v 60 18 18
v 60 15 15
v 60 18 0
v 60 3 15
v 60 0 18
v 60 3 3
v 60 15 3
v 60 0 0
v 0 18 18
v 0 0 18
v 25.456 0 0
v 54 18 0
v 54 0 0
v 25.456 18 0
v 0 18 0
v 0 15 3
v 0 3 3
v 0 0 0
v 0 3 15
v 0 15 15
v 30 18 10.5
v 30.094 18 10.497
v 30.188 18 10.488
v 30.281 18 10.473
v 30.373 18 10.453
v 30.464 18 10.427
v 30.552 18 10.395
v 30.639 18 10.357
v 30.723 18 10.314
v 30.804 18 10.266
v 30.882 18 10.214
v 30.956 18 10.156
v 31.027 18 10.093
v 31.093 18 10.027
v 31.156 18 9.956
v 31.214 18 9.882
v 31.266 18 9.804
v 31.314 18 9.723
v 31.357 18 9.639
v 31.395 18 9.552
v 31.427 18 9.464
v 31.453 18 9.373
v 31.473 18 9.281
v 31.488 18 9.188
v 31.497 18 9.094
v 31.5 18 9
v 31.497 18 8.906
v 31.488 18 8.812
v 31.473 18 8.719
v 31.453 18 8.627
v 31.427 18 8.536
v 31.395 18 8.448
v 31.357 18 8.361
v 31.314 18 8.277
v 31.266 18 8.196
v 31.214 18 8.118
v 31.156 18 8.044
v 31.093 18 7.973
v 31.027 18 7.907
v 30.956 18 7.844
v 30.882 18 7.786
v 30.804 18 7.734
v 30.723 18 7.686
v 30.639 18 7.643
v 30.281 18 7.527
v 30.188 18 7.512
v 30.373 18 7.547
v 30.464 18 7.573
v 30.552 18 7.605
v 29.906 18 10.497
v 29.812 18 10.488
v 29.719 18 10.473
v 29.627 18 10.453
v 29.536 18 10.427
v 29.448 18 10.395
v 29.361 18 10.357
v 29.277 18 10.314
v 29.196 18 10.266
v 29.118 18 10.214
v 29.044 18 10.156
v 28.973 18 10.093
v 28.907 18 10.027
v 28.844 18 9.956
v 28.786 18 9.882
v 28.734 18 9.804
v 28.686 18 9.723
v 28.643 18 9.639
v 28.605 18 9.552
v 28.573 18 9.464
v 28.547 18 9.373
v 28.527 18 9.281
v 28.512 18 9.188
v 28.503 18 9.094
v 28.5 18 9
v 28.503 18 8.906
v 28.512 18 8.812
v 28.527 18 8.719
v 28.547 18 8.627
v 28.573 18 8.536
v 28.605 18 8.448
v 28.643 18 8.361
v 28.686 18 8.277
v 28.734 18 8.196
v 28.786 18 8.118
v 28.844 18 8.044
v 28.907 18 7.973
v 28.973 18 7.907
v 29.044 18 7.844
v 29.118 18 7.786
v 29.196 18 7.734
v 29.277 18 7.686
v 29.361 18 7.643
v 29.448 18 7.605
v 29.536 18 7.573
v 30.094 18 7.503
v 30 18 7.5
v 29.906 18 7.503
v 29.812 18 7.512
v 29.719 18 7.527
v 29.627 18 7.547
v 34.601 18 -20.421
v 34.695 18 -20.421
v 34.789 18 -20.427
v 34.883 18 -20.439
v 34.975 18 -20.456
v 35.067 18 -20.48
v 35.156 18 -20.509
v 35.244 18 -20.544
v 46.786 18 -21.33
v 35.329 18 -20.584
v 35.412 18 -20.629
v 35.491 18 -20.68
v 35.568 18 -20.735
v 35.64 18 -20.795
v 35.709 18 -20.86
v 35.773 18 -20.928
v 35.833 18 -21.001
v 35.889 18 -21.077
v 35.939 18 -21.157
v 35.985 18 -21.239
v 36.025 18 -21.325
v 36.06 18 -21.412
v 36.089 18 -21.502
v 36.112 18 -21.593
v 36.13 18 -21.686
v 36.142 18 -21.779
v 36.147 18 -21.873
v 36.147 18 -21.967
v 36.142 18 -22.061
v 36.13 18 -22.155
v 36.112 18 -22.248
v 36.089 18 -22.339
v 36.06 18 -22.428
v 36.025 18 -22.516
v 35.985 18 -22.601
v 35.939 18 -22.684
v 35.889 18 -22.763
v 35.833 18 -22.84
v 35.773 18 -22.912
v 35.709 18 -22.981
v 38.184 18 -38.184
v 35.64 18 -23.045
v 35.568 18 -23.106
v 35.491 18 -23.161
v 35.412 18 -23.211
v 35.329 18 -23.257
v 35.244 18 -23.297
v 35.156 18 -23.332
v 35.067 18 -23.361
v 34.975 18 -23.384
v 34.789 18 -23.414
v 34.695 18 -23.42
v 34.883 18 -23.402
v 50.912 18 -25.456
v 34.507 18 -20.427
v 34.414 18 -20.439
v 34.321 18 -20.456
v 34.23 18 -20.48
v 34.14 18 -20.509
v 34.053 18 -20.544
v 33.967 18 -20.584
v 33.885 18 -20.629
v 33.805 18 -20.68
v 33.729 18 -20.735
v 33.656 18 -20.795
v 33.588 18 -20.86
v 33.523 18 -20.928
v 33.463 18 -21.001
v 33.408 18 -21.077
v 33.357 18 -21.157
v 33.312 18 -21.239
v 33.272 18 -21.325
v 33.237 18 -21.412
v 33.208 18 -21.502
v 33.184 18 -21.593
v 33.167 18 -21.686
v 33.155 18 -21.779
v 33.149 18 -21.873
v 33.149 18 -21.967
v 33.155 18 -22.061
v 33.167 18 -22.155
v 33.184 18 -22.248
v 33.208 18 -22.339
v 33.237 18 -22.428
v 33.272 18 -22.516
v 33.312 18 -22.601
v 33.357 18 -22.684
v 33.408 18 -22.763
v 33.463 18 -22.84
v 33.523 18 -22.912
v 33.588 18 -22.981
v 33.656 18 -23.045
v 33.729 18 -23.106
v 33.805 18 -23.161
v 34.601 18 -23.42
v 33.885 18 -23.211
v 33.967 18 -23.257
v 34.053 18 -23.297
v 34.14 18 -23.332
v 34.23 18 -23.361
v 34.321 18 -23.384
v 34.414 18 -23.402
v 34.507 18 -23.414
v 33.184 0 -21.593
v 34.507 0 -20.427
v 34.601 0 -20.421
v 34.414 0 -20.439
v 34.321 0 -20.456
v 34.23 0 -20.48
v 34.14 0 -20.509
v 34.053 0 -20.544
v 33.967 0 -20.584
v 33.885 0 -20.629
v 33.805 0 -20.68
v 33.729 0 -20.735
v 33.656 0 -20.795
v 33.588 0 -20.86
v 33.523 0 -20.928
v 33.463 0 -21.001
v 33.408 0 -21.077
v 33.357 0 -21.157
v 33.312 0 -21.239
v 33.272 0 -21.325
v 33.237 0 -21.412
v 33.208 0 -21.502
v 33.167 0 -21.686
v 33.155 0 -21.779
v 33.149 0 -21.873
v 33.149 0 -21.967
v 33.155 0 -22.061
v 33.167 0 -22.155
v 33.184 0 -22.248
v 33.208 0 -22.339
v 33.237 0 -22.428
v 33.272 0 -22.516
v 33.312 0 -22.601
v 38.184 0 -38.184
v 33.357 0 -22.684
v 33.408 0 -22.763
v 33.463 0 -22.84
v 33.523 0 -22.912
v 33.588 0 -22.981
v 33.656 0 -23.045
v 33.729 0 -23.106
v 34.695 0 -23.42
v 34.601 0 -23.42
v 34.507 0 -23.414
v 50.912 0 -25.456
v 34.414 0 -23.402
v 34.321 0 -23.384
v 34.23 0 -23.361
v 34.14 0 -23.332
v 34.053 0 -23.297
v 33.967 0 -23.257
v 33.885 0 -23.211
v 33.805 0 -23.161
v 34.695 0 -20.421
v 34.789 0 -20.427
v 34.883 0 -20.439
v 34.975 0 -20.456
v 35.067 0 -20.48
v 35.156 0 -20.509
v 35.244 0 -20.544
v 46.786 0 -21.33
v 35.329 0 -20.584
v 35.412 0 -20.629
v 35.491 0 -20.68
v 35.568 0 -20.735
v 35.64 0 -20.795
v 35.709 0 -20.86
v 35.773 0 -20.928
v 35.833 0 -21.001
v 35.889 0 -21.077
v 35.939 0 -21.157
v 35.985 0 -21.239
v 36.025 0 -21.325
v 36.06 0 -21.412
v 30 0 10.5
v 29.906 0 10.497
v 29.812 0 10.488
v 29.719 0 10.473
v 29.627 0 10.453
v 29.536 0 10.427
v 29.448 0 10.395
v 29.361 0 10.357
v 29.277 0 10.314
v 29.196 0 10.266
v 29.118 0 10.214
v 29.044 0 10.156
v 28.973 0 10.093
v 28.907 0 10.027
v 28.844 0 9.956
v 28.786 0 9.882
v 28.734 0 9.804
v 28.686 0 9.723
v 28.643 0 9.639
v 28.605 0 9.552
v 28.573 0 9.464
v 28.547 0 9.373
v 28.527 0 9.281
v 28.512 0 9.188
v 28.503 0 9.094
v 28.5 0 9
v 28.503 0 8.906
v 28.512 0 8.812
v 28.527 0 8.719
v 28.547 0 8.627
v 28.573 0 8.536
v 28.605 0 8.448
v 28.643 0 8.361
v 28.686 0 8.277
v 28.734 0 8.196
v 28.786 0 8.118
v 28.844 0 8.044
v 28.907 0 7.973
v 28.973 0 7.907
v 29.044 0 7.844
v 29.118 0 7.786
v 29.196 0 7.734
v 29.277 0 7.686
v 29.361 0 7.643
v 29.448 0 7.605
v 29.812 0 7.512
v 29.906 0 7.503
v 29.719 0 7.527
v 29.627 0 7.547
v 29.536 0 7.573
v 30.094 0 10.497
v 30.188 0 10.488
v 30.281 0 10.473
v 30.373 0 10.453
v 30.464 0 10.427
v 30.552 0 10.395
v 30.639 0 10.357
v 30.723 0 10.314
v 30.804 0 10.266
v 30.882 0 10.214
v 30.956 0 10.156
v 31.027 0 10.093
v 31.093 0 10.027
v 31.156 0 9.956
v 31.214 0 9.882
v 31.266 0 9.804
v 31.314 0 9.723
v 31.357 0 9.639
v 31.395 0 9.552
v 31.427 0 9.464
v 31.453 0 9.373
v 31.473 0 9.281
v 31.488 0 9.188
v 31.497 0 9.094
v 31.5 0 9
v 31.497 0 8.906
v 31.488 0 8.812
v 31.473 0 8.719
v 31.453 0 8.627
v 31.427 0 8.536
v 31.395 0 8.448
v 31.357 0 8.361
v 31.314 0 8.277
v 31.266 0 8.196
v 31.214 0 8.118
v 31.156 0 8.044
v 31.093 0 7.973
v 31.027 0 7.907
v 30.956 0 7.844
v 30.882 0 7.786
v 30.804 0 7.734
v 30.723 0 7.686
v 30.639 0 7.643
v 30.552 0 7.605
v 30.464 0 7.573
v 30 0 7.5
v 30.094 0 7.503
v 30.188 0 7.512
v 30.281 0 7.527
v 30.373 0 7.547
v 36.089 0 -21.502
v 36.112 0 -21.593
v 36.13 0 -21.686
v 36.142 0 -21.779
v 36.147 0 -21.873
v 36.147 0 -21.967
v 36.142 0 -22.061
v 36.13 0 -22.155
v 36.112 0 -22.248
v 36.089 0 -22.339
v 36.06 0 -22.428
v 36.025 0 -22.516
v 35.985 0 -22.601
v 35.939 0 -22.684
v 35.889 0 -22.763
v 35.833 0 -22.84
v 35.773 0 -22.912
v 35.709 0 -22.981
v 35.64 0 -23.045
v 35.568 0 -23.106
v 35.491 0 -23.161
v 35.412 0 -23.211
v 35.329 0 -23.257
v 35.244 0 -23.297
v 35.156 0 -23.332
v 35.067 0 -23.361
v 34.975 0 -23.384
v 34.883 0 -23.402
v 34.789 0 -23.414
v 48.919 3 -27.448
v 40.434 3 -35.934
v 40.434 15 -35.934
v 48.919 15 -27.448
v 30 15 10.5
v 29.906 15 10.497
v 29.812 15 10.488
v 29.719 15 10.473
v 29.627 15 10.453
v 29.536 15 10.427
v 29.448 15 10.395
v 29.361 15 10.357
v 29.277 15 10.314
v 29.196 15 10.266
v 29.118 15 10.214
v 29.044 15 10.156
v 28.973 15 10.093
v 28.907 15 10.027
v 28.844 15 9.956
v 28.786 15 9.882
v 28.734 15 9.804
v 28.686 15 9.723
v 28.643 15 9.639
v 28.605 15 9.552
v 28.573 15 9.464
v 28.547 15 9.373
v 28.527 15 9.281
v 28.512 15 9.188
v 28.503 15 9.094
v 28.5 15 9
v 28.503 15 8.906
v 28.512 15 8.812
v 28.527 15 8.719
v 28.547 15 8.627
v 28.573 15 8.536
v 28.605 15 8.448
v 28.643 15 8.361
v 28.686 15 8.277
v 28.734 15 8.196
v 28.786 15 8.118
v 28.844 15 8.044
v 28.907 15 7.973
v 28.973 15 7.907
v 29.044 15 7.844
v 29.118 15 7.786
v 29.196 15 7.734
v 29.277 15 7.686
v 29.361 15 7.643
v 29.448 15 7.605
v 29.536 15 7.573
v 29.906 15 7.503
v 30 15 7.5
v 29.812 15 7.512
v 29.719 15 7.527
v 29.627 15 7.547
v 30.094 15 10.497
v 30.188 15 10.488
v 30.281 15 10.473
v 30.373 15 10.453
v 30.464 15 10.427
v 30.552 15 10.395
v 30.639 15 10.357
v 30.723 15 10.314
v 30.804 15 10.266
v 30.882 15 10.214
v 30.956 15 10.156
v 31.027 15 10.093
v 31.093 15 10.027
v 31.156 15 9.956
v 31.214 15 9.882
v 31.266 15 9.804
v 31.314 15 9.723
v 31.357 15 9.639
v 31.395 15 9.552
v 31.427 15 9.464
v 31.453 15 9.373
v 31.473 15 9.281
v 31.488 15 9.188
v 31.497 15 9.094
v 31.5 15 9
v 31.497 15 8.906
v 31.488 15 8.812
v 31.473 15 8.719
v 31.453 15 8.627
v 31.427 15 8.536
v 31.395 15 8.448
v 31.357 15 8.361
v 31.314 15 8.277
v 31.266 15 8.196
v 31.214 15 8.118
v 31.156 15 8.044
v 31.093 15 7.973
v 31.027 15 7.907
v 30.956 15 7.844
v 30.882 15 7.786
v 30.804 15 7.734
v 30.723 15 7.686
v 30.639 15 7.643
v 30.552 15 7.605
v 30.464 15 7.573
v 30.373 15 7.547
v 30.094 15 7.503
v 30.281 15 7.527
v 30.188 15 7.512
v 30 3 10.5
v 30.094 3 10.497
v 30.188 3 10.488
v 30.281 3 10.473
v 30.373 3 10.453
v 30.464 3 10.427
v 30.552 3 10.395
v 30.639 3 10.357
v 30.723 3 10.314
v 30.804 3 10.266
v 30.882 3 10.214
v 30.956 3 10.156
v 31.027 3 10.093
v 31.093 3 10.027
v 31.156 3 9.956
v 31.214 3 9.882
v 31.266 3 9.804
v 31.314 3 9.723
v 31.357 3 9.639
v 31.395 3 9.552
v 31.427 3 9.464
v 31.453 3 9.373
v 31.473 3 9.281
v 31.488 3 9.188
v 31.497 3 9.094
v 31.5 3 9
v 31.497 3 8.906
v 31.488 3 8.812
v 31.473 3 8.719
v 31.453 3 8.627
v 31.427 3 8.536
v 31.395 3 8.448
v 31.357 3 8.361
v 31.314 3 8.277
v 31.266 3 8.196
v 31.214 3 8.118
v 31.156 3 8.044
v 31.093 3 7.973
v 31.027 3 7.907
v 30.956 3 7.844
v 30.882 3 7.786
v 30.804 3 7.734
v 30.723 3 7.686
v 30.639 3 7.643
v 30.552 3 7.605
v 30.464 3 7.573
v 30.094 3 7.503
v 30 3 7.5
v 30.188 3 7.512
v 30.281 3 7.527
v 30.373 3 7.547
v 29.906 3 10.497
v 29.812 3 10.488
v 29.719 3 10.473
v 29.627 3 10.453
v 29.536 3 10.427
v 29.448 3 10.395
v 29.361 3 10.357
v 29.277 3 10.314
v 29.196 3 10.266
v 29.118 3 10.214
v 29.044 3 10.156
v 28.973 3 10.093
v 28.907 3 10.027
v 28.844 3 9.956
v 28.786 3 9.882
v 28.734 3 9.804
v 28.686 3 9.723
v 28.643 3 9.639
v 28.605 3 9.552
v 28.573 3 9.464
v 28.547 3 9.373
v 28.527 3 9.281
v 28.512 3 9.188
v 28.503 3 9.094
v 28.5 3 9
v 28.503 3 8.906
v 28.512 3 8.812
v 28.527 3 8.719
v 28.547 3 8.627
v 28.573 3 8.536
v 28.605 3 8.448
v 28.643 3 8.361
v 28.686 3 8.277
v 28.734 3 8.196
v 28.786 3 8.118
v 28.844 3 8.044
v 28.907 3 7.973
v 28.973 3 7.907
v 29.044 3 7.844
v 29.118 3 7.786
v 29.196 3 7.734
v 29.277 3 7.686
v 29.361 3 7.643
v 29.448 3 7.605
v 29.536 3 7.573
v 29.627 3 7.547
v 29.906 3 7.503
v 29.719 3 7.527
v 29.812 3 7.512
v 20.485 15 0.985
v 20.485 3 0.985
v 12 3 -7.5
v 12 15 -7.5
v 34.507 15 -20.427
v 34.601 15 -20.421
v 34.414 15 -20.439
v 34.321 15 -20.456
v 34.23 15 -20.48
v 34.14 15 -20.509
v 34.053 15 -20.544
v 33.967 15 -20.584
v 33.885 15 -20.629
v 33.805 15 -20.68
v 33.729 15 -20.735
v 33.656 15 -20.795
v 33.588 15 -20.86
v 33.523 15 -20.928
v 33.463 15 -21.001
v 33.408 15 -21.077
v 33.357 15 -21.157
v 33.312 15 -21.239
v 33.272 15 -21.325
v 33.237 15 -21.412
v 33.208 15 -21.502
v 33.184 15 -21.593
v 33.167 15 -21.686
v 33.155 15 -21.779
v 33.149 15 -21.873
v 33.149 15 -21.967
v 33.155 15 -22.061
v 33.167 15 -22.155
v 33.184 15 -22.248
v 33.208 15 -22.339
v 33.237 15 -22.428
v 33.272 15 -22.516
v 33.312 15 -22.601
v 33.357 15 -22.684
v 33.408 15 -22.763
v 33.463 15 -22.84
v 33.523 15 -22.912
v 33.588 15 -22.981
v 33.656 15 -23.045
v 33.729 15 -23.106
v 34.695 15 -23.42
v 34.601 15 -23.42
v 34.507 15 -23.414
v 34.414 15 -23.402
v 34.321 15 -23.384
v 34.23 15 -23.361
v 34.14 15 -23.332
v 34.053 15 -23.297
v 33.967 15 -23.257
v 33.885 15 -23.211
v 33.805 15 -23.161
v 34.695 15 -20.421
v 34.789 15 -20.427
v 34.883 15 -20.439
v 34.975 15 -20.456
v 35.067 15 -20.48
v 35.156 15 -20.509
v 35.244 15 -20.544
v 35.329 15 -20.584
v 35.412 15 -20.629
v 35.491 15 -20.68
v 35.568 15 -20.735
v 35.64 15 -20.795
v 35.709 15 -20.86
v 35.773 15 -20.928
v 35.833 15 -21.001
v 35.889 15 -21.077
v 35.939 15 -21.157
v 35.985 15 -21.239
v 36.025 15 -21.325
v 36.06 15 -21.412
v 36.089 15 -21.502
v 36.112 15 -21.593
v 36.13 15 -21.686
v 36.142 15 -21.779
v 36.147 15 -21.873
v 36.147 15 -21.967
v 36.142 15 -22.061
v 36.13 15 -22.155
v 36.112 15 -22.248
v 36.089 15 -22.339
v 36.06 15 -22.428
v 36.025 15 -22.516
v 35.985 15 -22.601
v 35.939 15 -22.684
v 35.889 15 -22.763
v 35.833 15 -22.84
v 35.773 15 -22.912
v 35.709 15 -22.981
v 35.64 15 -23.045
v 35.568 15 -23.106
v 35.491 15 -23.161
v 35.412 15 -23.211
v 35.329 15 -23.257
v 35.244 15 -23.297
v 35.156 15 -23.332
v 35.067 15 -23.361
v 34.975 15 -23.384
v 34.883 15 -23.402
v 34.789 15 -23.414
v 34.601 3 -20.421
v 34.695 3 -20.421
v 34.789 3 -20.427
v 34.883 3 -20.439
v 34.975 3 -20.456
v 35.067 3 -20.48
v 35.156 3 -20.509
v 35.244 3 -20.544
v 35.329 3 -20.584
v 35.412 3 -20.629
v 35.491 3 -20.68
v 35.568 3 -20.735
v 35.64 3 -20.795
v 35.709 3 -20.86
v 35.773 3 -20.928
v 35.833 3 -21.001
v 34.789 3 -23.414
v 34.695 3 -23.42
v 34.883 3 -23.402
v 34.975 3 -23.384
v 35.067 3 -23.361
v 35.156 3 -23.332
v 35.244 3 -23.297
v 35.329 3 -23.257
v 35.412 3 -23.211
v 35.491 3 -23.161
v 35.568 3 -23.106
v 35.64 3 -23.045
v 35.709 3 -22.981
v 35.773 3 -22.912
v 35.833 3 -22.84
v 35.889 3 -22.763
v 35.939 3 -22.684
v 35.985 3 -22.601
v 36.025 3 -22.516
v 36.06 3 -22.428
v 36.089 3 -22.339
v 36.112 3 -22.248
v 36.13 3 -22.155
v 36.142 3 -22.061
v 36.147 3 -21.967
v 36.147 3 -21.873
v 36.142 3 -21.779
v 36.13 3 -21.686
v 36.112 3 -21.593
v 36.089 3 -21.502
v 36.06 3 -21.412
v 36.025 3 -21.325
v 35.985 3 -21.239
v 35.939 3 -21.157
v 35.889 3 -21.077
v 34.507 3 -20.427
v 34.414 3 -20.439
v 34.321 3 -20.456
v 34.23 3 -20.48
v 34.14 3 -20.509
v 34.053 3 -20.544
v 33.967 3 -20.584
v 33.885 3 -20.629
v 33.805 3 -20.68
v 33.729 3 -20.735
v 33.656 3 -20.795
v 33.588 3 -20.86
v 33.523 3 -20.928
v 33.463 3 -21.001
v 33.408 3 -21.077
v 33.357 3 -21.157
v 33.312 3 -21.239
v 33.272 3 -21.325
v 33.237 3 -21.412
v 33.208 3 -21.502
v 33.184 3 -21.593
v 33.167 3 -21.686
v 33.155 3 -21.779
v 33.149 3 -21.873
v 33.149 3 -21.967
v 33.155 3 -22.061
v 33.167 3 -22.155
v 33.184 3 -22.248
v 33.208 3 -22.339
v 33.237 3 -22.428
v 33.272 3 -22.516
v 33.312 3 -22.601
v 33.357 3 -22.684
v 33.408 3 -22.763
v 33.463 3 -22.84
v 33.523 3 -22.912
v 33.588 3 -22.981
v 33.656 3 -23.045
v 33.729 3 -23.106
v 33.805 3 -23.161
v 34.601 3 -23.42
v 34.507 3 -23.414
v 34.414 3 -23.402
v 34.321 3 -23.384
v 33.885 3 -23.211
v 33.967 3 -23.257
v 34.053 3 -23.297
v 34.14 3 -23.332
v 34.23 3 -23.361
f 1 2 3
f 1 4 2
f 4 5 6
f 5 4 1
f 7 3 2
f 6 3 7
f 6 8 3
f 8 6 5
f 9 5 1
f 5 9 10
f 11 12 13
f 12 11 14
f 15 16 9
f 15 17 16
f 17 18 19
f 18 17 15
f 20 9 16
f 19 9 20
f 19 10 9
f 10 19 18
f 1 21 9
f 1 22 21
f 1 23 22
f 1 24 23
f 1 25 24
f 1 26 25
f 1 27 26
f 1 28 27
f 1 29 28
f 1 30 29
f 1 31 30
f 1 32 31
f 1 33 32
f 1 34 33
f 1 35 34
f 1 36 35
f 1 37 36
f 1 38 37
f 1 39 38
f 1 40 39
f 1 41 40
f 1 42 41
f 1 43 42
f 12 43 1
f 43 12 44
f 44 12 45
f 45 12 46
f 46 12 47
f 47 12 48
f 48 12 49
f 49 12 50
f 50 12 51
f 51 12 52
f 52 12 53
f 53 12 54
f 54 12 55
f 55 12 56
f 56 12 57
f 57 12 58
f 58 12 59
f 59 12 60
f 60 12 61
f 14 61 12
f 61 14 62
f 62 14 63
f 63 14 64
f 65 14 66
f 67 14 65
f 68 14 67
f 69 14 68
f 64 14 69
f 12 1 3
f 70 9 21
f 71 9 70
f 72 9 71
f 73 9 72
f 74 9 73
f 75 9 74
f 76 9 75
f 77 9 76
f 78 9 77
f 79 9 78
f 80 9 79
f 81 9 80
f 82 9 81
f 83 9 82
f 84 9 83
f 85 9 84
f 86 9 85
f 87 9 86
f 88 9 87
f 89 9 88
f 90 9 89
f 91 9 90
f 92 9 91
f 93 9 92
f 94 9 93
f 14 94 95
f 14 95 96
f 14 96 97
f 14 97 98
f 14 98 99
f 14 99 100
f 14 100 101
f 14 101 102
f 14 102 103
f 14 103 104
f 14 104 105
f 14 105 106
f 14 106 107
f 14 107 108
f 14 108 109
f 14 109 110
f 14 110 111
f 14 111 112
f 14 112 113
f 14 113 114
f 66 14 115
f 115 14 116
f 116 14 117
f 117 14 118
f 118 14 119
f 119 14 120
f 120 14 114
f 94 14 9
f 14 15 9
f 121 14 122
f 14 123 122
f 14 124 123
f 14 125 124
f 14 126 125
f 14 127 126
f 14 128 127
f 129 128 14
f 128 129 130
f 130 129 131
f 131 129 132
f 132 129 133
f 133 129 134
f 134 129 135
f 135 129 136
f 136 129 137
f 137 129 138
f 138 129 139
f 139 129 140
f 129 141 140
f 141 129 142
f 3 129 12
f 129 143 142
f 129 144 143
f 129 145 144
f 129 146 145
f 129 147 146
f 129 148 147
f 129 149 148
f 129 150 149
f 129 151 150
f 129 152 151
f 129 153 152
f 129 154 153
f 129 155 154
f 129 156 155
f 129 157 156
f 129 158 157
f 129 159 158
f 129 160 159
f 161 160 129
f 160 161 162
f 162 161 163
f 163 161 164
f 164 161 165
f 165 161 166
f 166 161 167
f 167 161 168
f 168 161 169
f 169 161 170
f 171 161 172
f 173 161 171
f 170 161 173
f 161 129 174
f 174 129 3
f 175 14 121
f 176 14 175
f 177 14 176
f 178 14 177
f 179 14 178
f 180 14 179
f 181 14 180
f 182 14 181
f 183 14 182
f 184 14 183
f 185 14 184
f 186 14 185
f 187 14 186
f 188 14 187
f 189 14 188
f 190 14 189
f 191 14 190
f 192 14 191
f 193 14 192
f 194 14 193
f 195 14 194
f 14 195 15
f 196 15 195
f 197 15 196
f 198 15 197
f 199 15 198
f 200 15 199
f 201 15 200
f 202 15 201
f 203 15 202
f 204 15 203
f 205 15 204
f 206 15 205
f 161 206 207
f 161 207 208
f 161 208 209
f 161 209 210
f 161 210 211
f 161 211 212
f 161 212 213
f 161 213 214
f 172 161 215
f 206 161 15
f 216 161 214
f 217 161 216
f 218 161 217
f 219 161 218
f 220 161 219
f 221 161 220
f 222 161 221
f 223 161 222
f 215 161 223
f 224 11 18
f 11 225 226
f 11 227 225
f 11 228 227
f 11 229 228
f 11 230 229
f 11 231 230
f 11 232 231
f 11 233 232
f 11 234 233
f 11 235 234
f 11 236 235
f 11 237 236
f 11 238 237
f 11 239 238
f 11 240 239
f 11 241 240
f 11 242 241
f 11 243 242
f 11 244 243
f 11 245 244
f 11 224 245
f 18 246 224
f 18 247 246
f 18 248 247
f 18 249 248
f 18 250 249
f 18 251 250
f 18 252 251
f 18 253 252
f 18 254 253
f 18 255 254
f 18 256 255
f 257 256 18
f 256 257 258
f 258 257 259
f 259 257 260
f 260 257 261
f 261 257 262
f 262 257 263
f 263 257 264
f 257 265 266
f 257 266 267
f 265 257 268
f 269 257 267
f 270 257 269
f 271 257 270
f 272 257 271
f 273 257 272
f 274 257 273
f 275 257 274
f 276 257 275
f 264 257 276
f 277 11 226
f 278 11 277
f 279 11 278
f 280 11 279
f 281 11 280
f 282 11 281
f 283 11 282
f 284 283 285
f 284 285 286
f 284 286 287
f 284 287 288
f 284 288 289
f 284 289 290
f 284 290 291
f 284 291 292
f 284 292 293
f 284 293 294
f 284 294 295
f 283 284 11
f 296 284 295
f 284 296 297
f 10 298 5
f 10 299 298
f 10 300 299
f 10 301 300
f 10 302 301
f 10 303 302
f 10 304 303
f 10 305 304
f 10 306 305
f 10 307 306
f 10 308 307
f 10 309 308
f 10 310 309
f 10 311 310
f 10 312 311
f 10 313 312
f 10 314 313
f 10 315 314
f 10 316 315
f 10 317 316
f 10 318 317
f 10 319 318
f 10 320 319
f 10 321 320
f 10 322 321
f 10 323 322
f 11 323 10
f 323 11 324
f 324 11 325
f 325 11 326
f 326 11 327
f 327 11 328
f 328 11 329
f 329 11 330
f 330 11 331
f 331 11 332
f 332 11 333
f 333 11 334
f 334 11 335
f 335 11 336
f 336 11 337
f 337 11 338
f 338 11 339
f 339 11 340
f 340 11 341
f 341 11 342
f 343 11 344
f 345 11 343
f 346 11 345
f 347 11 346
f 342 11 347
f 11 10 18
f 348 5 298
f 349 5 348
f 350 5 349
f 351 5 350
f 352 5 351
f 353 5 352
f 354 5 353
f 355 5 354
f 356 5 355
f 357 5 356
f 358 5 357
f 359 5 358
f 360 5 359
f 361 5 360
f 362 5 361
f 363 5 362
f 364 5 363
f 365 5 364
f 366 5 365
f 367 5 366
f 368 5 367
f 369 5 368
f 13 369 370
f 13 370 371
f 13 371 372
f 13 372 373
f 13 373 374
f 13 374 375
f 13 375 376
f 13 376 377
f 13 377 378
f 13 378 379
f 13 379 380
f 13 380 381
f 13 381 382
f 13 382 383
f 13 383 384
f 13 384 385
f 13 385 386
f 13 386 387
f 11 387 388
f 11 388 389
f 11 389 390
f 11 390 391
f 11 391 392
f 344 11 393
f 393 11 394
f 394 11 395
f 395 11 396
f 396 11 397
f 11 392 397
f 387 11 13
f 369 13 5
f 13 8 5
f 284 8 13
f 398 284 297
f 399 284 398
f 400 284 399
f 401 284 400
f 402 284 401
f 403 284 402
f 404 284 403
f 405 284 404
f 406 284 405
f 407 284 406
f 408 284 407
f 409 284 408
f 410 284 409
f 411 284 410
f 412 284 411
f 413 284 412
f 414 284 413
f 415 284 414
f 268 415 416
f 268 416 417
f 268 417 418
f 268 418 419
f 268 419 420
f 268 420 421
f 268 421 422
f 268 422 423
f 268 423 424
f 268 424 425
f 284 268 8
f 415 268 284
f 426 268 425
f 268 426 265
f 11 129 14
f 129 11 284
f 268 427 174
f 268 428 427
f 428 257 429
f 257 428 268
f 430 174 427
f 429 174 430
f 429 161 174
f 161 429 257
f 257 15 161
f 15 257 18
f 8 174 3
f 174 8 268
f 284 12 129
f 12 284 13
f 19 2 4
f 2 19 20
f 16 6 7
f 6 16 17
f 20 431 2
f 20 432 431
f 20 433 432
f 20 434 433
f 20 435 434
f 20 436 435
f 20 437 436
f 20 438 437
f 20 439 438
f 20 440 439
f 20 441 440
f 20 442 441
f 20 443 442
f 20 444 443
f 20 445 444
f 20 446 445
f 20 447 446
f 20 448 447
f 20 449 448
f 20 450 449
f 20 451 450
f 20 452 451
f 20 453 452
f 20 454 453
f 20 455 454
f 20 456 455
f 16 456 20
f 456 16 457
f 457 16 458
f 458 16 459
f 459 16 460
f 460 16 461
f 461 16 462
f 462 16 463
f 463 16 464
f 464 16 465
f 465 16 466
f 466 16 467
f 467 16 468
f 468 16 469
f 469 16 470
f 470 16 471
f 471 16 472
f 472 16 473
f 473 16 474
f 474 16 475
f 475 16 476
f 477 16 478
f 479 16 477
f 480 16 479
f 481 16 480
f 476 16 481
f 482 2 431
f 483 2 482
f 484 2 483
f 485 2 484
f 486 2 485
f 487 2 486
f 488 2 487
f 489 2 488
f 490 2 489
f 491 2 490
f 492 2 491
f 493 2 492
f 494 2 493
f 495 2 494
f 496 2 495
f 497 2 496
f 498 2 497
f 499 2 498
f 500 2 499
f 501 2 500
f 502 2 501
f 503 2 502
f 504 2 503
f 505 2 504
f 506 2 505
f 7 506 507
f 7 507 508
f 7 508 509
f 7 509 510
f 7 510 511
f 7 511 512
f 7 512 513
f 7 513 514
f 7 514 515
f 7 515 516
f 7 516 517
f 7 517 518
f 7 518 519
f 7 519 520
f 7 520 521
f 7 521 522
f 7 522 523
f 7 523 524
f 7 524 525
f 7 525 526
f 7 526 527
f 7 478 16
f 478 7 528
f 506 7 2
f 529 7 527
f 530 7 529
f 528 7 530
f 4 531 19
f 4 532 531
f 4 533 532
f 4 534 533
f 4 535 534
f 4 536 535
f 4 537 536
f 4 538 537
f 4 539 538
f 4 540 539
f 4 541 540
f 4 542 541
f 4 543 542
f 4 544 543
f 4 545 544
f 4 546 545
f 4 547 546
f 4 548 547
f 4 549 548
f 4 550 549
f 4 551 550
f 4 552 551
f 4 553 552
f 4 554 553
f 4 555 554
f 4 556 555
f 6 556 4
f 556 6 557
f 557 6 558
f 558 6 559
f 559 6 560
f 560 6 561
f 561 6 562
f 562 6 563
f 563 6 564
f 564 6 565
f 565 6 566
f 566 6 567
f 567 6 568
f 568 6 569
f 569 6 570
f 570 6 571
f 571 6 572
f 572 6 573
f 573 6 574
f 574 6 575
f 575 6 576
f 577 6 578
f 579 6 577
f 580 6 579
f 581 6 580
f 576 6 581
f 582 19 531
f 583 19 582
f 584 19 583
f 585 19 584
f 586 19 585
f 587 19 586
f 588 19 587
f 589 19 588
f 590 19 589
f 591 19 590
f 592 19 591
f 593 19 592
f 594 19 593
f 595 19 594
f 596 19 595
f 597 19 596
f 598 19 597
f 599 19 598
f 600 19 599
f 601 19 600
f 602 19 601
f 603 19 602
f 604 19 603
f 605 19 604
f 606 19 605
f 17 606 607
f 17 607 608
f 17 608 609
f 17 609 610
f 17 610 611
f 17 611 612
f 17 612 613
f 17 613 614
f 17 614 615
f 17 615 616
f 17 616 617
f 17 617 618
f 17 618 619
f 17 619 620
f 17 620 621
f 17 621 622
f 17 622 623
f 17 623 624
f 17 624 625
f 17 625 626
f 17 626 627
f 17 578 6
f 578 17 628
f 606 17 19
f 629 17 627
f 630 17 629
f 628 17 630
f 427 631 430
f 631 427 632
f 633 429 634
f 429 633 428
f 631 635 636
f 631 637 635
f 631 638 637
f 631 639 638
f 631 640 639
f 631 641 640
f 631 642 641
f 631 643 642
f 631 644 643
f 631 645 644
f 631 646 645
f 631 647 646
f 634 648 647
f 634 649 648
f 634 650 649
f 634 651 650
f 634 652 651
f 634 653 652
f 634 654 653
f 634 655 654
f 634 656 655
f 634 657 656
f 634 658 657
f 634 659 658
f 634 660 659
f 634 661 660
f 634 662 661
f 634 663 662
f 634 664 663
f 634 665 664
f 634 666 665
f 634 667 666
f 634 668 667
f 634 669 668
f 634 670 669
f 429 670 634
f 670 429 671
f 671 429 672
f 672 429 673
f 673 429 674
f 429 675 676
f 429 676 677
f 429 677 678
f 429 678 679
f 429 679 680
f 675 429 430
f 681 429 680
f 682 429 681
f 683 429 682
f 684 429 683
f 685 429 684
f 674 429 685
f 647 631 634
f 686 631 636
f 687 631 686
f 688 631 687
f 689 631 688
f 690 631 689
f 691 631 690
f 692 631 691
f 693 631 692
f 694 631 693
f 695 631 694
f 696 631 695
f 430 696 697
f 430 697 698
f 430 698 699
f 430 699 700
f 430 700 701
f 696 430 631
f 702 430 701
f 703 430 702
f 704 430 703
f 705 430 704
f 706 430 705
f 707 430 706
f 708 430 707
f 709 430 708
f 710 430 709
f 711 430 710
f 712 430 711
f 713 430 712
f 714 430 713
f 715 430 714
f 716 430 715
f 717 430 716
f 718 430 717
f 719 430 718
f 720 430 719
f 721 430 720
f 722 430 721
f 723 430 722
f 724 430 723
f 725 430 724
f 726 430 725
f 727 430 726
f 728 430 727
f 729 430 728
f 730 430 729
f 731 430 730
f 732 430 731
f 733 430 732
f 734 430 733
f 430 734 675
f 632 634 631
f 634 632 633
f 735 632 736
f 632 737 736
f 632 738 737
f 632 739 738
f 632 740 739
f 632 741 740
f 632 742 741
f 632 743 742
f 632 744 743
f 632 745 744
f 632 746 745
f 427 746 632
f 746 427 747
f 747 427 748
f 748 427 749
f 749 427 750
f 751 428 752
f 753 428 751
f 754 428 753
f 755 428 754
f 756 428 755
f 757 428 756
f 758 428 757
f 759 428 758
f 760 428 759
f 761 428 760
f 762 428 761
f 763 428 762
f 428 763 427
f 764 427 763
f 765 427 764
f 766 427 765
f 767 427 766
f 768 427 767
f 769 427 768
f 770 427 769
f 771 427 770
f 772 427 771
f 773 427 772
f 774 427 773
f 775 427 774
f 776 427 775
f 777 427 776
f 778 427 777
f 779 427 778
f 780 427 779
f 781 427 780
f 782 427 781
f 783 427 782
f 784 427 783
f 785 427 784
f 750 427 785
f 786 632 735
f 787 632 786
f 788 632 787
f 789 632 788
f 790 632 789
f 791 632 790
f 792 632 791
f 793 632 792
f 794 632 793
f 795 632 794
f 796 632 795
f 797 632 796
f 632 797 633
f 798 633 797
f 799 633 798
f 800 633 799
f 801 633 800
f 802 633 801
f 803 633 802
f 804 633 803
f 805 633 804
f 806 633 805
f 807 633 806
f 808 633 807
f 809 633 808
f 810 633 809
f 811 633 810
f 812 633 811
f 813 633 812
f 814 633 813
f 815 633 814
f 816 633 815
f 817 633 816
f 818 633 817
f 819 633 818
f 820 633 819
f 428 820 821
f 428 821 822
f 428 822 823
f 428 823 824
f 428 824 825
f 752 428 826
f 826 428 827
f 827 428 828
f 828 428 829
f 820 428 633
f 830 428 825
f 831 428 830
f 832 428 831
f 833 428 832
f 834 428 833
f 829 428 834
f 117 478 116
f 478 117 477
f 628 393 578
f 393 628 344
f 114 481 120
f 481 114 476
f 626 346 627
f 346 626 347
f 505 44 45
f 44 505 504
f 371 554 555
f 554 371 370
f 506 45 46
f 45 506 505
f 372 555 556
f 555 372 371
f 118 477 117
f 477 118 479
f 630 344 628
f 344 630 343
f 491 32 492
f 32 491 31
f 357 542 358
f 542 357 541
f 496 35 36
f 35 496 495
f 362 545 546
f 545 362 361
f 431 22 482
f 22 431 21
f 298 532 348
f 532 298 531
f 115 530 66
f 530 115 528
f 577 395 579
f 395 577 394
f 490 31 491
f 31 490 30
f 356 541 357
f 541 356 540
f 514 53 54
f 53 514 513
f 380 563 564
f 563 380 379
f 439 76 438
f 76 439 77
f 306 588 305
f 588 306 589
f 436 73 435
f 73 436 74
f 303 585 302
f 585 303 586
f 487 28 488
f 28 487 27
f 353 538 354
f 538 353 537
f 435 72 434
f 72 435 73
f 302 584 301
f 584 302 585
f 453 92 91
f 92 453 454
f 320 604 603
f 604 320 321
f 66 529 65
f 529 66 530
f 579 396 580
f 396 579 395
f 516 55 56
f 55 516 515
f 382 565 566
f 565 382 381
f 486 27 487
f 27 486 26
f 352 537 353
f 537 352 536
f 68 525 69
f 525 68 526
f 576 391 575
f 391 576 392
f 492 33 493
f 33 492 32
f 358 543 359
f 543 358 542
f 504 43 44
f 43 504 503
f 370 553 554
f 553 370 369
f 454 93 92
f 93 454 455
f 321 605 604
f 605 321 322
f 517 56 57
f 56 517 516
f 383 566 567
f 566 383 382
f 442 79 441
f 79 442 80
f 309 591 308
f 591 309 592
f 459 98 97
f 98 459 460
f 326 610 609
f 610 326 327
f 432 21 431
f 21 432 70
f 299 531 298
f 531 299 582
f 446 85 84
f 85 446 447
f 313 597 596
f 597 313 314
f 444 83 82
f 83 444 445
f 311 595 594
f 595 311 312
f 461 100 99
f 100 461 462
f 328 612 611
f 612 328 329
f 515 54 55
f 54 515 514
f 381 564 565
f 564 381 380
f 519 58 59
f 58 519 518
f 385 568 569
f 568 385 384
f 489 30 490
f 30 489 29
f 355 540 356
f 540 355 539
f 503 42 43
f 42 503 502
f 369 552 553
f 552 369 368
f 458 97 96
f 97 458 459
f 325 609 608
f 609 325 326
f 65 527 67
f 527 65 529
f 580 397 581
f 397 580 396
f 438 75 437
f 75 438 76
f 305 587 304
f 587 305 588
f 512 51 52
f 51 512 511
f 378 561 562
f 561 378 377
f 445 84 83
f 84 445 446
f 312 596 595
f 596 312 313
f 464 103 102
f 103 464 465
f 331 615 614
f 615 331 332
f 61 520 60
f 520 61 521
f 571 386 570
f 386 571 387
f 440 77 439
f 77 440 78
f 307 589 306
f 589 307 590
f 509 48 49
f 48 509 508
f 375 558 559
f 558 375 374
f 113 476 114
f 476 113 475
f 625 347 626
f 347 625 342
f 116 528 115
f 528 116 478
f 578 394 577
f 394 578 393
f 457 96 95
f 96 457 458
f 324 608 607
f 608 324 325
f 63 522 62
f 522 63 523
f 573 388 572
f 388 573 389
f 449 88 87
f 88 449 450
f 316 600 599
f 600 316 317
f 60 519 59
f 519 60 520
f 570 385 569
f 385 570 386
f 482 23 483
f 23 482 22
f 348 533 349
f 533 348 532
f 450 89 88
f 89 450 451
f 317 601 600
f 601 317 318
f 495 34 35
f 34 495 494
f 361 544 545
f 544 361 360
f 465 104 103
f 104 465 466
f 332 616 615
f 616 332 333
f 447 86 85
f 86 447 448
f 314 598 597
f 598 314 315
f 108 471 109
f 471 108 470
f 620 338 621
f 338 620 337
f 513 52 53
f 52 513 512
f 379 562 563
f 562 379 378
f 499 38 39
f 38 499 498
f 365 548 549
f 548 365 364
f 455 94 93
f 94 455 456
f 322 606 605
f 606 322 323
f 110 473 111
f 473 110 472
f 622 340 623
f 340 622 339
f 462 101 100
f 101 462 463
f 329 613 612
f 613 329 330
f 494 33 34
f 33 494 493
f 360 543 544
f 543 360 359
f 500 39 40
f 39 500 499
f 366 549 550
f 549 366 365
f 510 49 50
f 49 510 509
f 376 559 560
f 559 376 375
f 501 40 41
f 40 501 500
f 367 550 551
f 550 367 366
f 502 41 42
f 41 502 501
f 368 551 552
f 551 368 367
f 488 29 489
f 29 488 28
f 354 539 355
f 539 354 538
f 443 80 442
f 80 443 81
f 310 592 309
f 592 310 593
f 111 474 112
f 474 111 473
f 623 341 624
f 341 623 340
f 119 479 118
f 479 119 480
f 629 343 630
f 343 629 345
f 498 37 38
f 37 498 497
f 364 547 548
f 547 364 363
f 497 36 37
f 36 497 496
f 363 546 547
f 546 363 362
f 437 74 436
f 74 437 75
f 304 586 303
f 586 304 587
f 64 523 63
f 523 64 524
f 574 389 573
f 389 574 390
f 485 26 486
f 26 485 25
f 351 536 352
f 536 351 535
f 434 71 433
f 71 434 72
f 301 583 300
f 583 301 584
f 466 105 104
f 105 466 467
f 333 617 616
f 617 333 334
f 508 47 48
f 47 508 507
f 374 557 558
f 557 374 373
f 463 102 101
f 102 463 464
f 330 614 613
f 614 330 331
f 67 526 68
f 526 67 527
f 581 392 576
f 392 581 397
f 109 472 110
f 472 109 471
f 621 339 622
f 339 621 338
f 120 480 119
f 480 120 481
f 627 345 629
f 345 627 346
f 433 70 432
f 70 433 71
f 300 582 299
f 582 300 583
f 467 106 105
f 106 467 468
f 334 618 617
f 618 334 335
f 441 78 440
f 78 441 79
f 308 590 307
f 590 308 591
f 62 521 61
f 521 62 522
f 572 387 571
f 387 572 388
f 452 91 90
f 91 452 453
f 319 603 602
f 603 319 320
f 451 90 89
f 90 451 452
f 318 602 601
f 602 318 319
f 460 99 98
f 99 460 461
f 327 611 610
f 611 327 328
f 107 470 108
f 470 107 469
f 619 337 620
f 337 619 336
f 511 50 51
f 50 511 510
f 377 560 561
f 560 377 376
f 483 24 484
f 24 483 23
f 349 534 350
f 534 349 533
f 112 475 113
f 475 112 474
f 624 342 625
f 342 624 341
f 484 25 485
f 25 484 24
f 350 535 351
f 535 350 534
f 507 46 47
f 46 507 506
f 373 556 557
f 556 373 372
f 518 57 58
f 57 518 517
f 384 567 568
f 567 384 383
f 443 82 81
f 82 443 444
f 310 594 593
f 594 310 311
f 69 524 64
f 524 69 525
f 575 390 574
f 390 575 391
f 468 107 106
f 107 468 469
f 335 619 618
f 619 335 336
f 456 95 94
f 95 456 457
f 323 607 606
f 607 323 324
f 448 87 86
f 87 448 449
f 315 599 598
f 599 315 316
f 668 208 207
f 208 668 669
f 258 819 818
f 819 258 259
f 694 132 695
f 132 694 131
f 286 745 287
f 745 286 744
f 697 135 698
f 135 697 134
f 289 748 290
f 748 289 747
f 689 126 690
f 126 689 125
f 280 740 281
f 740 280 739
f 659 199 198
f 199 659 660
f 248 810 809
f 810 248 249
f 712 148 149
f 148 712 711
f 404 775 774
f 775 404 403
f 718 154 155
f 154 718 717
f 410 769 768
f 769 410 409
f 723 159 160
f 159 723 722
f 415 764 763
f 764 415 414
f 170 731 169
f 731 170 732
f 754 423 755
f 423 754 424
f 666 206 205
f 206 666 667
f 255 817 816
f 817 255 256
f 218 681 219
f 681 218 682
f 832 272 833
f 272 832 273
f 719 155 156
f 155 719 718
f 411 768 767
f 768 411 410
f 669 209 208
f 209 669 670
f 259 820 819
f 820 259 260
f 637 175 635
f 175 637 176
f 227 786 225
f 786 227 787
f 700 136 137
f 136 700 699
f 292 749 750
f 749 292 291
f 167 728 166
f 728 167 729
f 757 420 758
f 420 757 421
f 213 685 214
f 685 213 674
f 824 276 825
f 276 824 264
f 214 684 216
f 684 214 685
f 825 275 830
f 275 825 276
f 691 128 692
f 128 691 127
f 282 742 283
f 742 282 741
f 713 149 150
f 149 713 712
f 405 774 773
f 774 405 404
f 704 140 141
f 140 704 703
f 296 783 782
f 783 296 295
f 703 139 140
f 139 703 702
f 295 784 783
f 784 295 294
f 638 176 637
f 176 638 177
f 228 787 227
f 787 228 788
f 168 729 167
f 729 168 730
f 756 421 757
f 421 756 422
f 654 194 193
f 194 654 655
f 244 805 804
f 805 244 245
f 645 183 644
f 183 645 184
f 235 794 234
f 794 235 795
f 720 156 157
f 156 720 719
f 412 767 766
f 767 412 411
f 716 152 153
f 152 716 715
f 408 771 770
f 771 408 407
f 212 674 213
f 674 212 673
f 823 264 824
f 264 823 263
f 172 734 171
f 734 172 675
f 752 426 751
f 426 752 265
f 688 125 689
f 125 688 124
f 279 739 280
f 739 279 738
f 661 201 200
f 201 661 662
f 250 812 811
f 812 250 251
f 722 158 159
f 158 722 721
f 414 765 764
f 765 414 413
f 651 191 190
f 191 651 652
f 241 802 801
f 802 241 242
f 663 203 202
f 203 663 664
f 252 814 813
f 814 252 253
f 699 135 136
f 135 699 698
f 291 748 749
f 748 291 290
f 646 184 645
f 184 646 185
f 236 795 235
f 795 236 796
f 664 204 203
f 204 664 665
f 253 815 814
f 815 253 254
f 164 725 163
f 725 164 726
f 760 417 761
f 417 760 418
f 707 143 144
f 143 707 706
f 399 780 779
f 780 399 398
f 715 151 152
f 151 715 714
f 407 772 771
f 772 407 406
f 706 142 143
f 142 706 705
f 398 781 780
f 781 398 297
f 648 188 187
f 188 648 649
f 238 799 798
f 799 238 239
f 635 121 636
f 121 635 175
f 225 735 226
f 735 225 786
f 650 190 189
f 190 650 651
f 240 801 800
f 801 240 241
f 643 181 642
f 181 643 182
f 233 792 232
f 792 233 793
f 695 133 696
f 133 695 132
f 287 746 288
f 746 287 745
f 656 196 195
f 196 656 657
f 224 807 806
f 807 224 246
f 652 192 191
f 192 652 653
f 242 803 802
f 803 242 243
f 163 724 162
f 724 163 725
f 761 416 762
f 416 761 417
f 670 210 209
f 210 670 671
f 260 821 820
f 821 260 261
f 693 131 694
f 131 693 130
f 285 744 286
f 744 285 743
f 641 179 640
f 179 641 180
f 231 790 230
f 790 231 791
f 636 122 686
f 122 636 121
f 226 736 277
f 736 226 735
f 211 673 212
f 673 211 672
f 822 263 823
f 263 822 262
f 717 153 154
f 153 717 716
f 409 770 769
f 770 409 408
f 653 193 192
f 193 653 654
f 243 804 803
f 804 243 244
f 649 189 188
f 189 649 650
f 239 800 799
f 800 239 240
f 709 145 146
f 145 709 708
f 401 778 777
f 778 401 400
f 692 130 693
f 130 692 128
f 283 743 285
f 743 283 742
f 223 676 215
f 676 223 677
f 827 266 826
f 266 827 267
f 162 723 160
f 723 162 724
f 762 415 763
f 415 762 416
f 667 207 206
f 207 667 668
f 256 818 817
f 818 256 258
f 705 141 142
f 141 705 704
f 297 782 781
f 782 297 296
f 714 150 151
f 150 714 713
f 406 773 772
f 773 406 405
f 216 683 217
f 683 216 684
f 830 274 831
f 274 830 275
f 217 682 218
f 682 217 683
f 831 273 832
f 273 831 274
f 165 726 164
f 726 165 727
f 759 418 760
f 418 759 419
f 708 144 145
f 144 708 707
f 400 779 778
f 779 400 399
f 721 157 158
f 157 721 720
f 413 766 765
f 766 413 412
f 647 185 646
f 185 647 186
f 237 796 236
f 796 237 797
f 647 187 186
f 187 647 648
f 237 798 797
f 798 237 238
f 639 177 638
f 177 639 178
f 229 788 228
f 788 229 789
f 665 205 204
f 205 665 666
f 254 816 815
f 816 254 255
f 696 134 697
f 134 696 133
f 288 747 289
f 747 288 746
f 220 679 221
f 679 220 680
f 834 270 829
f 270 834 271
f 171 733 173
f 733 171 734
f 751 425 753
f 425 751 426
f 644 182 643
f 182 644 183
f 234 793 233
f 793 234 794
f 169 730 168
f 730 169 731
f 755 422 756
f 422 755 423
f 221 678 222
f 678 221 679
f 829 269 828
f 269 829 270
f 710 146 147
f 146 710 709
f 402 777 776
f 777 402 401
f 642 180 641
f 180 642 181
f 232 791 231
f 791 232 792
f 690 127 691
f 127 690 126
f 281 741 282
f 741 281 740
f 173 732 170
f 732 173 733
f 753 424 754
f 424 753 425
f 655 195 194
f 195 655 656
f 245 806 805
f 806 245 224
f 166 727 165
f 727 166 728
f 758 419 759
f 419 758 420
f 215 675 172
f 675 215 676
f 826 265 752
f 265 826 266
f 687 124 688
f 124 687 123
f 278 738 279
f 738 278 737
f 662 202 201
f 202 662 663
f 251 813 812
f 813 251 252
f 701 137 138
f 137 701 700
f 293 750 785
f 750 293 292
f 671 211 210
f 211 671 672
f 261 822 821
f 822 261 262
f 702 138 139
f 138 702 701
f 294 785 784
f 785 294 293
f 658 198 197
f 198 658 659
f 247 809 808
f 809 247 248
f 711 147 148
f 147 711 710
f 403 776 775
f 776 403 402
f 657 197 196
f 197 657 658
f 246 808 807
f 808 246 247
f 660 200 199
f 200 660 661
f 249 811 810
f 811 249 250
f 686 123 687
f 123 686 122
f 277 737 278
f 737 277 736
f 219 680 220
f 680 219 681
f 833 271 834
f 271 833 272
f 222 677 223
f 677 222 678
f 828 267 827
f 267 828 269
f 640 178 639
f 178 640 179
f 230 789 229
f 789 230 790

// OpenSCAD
/**
 *
 * RotorPrint, customizable landing gear adapter
 * Made by Dave de Fijter - 2013
 *
**/

// preview[view:south east, tilt:side]

/* [Global] */

what_part = "adapter"; // [adapter, stopper]

// The length of the landing gear part, the longer the more rigid
shaft_length = 60;

// The inner diameter of the part, should be about the same as the outer diameter of your tubes.
inner_diameter = 12;

// The thickness of the walls, the thicker the stronger, but might look very bulky if you overdo this.
wall_thickness = 3;

// The diameter of the screw hole, use 0 for no holes
screw_diameter = 3;

/* [Hidden] */

$fn = 100;

choose_part();

module choose_part() {

	if(what_part == "adapter") {
		adapter();
	} else {
		landing();
	}
}

module landing() {
	difference() {
		union() {
			difference() {
				cube([shaft_length+inner_diameter*2, inner_diameter + 2*wall_thickness, inner_diameter + 2*wall_thickness]);
				
				translate([0-wall_thickness, wall_thickness, wall_thickness]) {
					cube([shaft_length+wall_thickness, inner_diameter, inner_diameter]);
				}
			}
			
			difference() {
			
				translate([shaft_length+inner_diameter*1.0, wall_thickness + (inner_diameter/2),  wall_thickness + (inner_diameter/2)]) {
					sphere(r=inner_diameter*1.5);
				}
	
				translate([shaft_length + inner_diameter*1.0, wall_thickness + (inner_diameter / 2),  wall_thickness + (inner_diameter / 2)]) {
					rotate([0, 45, 0]) {
						translate([-1.5*inner_diameter, 0, 0]) {
							cube(inner_diameter*3, center=true);
						}
					}
				}	
	
				
			}
	
		}
		
		if(screw_diameter > 0) {
			translate([shaft_length / 2, inner_diameter + (3*wall_thickness), wall_thickness+(inner_diameter/2)]) {
				rotate(90, [1, 0, 0]) {
					cylinder(r=screw_diameter/2, h=(inner_diameter + (4 * wall_thickness)));
				}
			}
		}
	}
}

module adapter() {
	difference() {
		difference() {
			
			union() {
				difference() {
				
					difference() {
						hull() {  outlines(false); }
						outlines(false);
					}
					translate([0, -1, 0]) {
						scale([0.9, 1.1, 0.95]) {
							difference() {
								hull() {  outlines(false); }
								outlines(false);
							}
						}
					}
				}
				
				
				
				difference() {
					outlines(false);
					outlines(true);
				}
			}
			
			
			union() {
		
				if(screw_diameter > 0) {
					translate([shaft_length / 2, inner_diameter + (3*wall_thickness), wall_thickness+(inner_diameter/2)]) {
						rotate(90, [1, 0, 0]) {
							cylinder(r=screw_diameter/2, h=(inner_diameter + (4 * wall_thickness)));
						}
					}
					
					rotate(45, [0, 1, 0]) {
						translate([shaft_length / 1.5, inner_diameter + (3*wall_thickness), wall_thickness+(inner_diameter/2)]) {
							rotate(90, [1, 0, 0]) {
								cylinder(r=screw_diameter/2, h=(inner_diameter + (4 * wall_thickness)));
							}
						}
				}
				}
		}
		}
		
		outlines(true);
	
	}
}

module outlines(render_inner) {

if(render_inner) {

		translate([-5, wall_thickness, wall_thickness]) {
			cube([shaft_length + 50, inner_diameter, inner_diameter]);
		}
	
	
		translate([0 + inner_diameter, wall_thickness, (wall_thickness + wall_thickness/2) - inner_diameter]) {
			rotate(45, [0, 1, 0]) {
				cube([shaft_length + 15, inner_diameter, inner_diameter]);			
			}
		}

} else {
	cube([shaft_length, inner_diameter + wall_thickness*2, inner_diameter + wall_thickness*2]);

	translate([0, 0, 0]) {
		rotate(45, [0, 1, 0]) {
			cube([shaft_length-wall_thickness*2, inner_diameter + wall_thickness*2, inner_diameter + wall_thickness*2]);
		}	
	}
}


}


//cube(inner_diameter + wall_thickness
